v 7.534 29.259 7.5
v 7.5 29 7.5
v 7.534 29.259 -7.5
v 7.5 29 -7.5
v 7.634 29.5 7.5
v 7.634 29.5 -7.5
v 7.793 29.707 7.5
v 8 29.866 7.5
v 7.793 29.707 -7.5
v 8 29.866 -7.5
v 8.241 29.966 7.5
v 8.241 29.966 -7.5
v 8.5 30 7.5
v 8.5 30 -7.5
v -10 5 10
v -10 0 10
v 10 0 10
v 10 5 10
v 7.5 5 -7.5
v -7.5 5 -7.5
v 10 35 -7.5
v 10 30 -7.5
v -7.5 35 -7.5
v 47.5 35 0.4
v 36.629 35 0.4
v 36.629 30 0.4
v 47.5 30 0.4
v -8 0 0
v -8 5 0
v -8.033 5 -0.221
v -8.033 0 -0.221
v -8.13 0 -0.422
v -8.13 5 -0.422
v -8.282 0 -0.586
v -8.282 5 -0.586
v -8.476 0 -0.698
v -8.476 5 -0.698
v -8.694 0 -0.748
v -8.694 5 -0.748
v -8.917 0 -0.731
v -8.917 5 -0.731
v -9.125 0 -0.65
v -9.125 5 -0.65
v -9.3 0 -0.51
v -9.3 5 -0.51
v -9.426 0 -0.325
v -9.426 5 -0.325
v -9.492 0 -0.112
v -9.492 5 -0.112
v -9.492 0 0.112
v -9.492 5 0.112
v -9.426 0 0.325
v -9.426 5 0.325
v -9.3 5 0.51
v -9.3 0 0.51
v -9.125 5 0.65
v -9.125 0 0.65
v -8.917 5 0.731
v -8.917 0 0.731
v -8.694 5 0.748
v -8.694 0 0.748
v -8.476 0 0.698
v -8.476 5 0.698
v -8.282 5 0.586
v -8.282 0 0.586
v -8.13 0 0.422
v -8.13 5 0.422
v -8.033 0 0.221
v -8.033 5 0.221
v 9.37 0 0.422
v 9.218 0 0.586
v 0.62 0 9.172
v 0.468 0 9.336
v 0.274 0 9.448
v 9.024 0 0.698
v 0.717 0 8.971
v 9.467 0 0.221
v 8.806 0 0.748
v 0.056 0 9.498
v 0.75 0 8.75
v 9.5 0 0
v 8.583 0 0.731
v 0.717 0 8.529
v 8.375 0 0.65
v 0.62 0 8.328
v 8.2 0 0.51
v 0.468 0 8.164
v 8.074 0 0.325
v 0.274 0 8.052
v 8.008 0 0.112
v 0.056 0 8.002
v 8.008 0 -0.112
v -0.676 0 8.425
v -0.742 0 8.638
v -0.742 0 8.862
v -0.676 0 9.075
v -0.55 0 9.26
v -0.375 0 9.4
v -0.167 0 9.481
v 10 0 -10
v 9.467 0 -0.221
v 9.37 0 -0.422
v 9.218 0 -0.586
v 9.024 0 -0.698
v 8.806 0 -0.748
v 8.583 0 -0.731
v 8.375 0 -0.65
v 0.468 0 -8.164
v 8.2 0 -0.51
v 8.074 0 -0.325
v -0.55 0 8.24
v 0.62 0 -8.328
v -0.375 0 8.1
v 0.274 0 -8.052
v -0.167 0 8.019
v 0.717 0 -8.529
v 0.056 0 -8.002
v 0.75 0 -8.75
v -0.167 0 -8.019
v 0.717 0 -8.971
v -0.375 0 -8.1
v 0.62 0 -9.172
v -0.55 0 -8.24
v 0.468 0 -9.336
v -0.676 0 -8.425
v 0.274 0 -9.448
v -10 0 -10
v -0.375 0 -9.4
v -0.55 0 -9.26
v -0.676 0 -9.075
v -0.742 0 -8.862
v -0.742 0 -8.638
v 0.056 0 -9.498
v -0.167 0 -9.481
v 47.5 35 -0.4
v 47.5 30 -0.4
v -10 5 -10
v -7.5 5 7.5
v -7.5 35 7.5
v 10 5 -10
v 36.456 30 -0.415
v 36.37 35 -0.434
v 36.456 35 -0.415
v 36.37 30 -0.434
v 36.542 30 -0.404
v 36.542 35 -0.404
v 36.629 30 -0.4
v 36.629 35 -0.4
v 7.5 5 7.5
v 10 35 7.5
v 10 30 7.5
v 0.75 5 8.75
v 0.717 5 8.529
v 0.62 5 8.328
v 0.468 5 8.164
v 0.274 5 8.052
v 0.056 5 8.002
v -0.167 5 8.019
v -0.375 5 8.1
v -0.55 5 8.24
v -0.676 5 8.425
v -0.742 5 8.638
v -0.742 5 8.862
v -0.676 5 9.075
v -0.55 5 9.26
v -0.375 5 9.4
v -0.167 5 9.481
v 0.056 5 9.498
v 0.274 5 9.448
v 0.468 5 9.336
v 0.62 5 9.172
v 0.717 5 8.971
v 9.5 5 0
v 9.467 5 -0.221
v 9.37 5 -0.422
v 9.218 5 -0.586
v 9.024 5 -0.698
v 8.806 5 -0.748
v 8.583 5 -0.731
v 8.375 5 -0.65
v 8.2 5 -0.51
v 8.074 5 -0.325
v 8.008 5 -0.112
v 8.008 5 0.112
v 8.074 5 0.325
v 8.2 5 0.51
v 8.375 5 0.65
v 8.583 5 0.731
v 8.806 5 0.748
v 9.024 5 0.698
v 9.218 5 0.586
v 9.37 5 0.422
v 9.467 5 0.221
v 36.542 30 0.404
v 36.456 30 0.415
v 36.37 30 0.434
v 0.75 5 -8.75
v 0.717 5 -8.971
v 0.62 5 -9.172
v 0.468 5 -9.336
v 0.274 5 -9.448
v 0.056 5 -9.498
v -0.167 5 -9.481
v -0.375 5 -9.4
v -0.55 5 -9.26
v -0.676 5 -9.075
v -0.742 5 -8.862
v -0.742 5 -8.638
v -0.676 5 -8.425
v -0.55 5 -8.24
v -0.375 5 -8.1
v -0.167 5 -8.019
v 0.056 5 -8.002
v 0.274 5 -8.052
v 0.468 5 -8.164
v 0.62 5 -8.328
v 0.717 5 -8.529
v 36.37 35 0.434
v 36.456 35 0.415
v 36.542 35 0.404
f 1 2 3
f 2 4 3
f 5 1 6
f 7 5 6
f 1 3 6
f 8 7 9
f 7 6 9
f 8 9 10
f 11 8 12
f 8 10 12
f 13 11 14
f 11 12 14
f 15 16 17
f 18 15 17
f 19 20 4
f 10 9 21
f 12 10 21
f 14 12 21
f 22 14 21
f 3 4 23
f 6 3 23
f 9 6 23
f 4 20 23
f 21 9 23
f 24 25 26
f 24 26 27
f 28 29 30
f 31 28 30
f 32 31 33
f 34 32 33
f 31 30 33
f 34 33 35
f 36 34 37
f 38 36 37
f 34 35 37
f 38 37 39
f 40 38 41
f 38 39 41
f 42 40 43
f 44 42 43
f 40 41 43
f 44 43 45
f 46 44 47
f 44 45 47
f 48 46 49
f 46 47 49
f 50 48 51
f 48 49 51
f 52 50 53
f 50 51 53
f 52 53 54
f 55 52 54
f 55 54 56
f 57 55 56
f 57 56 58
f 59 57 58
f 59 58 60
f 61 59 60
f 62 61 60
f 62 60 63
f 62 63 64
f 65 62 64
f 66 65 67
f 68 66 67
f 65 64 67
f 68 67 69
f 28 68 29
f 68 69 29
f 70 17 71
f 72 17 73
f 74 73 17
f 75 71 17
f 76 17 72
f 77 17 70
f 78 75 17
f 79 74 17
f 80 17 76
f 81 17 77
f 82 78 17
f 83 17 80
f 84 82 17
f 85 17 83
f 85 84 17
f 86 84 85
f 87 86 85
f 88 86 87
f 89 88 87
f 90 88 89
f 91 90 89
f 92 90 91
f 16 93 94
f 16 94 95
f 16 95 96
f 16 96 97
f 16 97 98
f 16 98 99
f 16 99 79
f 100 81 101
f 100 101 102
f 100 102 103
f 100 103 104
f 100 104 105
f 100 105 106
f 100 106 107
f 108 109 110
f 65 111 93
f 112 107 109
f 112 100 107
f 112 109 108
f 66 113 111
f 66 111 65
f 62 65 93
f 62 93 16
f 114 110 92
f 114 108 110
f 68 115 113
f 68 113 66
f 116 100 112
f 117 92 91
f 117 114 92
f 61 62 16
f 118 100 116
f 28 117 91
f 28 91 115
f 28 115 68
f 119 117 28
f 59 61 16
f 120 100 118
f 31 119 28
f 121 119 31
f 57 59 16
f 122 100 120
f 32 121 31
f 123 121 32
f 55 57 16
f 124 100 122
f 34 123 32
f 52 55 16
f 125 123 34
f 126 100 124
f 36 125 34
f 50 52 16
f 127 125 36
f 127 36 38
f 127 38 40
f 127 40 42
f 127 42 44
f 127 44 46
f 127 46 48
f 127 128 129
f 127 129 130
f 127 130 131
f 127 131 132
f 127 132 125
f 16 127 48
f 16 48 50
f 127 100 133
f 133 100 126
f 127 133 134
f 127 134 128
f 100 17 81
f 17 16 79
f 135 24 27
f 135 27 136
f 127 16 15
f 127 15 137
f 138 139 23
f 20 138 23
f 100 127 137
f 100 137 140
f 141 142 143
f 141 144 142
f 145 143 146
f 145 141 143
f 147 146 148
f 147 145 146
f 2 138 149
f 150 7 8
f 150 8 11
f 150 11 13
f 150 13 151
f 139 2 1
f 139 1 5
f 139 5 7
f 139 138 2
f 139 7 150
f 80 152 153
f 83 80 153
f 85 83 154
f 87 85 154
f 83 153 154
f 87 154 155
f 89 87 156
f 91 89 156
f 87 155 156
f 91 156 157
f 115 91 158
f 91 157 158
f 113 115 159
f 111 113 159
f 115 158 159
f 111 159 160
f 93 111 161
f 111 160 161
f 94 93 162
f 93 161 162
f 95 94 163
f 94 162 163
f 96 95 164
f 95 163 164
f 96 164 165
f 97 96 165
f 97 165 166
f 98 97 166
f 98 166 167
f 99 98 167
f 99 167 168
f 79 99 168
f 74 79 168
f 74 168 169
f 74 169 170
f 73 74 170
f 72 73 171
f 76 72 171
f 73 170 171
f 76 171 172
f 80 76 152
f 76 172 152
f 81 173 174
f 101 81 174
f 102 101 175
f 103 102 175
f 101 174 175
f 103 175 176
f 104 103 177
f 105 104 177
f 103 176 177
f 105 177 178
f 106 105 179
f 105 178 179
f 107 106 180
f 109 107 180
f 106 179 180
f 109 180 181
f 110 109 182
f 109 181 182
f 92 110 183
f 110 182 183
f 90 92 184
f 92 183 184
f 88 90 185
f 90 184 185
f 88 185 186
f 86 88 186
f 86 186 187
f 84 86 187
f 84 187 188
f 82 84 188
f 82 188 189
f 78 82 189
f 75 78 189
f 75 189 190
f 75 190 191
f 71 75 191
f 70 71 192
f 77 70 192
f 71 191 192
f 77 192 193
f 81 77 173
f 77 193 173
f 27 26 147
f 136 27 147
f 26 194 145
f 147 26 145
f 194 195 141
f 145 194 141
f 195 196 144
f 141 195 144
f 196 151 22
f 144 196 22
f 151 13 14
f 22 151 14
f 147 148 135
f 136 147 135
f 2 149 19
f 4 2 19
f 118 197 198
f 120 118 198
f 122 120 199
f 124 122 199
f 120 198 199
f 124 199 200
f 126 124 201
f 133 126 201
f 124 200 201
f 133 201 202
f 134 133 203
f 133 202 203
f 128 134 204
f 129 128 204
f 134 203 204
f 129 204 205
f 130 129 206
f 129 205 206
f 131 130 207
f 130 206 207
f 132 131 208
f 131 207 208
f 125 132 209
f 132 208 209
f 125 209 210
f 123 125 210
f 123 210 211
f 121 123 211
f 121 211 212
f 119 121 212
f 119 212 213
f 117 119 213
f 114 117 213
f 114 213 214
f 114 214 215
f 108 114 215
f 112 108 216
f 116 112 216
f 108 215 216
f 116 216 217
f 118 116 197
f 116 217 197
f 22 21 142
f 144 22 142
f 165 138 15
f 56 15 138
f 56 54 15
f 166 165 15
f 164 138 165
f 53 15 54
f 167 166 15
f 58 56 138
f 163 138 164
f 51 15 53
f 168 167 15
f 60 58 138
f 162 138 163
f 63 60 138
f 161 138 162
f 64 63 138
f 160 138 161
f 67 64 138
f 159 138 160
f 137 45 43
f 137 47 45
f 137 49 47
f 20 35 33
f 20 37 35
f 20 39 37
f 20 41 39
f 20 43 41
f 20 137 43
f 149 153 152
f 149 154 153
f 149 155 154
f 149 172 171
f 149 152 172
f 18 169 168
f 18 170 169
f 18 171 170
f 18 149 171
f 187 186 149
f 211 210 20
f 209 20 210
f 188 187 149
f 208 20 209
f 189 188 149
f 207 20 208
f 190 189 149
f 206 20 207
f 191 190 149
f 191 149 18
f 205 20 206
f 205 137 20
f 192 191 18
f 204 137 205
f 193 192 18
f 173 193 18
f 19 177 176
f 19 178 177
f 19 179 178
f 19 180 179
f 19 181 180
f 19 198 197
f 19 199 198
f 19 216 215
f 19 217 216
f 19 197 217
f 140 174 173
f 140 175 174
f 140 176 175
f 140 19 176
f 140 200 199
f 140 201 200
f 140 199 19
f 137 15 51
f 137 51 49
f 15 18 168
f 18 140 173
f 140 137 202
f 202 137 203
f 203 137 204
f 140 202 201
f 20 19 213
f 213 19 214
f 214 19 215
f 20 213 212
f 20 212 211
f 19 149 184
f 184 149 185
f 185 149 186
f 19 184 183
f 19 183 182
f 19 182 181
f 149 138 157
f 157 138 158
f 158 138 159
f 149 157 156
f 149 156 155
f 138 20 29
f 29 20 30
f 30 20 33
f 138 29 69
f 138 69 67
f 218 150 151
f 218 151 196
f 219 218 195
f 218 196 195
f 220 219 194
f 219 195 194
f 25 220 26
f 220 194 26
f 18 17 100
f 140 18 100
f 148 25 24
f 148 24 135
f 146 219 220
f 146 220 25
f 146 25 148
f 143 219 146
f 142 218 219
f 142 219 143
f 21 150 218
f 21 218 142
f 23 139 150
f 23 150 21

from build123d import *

# Parameters (mm, degrees)
ESQUISSE1_W             = 20
ESQUISSE1_H             = 20
BOSS_EXTRU_1_DEPTH      = 5
ESQUISSE2_W             = 15
ESQUISSE2_H             = 15
BOSS_EXTRU_2_DEPTH      = 35
ESQUISSE3_R             = 0.75
ENL_V_MAT_EXTRU_1_DEPTH = 5
ESQUISSE5_W             = 15
ESQUISSE5_H             = 5
BOSS_EXTRU_3_DEPTH      = 40
ENL_V_MAT_EXTRU_2_DEPTH = 5
CONG_1_R                = 1


with BuildPart() as part:
    # Esquisse1 → Boss.-Extru.1 (new body)
    with BuildSketch(Plane(origin=(0, 0, 0), x_dir=(1, 0, 0), z_dir=(0, 1, 0))):
        Rectangle(ESQUISSE1_W, ESQUISSE1_H)
    extrude(amount=BOSS_EXTRU_1_DEPTH)

    # Esquisse2 → Boss.-Extru.2 (add)
    with BuildSketch(Plane(origin=(0, 0, 0), x_dir=(-1, 0, 0), z_dir=(0, -1, 0))):
        Rectangle(ESQUISSE2_W, ESQUISSE2_H)
    extrude(amount=-BOSS_EXTRU_2_DEPTH)

    # Esquisse3 → Enlèv. mat.-Extru.1 (cut)
    with BuildSketch(Plane(origin=(0, 5, 0), x_dir=(1, 0, 0), z_dir=(0, 1, 0))):
        with Locations((-8.75, 0)):
            Circle(ESQUISSE3_R)
        with Locations((0, 8.75)):
            Circle(ESQUISSE3_R)
        with Locations((8.75, 0)):
            Circle(ESQUISSE3_R)
        with Locations((0, -8.75)):
            Circle(ESQUISSE3_R)
    extrude(amount=-ENL_V_MAT_EXTRU_1_DEPTH, mode=Mode.SUBTRACT)

    # Esquisse5 → Boss.-Extru.3 (add)
    with BuildSketch(Plane(origin=(7.5, 0, 0), x_dir=(0, 0, -1), z_dir=(1, 0, 0))):
        with Locations((0, 32.5)):
            Rectangle(ESQUISSE5_W, ESQUISSE5_H)
    extrude(amount=BOSS_EXTRU_3_DEPTH)

    # Esquisse6 → Enlèv. mat.-Extru.2 (cut)
    with BuildSketch(Plane(origin=(0, 35, 0), x_dir=(1, 0, 0), z_dir=(0, 1, 0))):
        Polygon((10, 7.5), (36.497560734, 0.4), (47.5, 0.4), (47.5, 7.5), align=None)
        Polygon((36.497560734, -0.4), (47.5, -0.4), (47.5, -7.5), (10, -7.5), align=None)
    extrude(amount=-ENL_V_MAT_EXTRU_2_DEPTH, mode=Mode.SUBTRACT)

    # Congé1
    cong_1_edges = [part.edges().sort_by_distance(p)[0] for p in [
        (7.5, 30, 0),
        (36.497560734, 32.5, -0.4),
        (36.497560734, 32.5, 0.4),
    ]]
    fillet(cong_1_edges, radius=CONG_1_R)


solid = part.part
